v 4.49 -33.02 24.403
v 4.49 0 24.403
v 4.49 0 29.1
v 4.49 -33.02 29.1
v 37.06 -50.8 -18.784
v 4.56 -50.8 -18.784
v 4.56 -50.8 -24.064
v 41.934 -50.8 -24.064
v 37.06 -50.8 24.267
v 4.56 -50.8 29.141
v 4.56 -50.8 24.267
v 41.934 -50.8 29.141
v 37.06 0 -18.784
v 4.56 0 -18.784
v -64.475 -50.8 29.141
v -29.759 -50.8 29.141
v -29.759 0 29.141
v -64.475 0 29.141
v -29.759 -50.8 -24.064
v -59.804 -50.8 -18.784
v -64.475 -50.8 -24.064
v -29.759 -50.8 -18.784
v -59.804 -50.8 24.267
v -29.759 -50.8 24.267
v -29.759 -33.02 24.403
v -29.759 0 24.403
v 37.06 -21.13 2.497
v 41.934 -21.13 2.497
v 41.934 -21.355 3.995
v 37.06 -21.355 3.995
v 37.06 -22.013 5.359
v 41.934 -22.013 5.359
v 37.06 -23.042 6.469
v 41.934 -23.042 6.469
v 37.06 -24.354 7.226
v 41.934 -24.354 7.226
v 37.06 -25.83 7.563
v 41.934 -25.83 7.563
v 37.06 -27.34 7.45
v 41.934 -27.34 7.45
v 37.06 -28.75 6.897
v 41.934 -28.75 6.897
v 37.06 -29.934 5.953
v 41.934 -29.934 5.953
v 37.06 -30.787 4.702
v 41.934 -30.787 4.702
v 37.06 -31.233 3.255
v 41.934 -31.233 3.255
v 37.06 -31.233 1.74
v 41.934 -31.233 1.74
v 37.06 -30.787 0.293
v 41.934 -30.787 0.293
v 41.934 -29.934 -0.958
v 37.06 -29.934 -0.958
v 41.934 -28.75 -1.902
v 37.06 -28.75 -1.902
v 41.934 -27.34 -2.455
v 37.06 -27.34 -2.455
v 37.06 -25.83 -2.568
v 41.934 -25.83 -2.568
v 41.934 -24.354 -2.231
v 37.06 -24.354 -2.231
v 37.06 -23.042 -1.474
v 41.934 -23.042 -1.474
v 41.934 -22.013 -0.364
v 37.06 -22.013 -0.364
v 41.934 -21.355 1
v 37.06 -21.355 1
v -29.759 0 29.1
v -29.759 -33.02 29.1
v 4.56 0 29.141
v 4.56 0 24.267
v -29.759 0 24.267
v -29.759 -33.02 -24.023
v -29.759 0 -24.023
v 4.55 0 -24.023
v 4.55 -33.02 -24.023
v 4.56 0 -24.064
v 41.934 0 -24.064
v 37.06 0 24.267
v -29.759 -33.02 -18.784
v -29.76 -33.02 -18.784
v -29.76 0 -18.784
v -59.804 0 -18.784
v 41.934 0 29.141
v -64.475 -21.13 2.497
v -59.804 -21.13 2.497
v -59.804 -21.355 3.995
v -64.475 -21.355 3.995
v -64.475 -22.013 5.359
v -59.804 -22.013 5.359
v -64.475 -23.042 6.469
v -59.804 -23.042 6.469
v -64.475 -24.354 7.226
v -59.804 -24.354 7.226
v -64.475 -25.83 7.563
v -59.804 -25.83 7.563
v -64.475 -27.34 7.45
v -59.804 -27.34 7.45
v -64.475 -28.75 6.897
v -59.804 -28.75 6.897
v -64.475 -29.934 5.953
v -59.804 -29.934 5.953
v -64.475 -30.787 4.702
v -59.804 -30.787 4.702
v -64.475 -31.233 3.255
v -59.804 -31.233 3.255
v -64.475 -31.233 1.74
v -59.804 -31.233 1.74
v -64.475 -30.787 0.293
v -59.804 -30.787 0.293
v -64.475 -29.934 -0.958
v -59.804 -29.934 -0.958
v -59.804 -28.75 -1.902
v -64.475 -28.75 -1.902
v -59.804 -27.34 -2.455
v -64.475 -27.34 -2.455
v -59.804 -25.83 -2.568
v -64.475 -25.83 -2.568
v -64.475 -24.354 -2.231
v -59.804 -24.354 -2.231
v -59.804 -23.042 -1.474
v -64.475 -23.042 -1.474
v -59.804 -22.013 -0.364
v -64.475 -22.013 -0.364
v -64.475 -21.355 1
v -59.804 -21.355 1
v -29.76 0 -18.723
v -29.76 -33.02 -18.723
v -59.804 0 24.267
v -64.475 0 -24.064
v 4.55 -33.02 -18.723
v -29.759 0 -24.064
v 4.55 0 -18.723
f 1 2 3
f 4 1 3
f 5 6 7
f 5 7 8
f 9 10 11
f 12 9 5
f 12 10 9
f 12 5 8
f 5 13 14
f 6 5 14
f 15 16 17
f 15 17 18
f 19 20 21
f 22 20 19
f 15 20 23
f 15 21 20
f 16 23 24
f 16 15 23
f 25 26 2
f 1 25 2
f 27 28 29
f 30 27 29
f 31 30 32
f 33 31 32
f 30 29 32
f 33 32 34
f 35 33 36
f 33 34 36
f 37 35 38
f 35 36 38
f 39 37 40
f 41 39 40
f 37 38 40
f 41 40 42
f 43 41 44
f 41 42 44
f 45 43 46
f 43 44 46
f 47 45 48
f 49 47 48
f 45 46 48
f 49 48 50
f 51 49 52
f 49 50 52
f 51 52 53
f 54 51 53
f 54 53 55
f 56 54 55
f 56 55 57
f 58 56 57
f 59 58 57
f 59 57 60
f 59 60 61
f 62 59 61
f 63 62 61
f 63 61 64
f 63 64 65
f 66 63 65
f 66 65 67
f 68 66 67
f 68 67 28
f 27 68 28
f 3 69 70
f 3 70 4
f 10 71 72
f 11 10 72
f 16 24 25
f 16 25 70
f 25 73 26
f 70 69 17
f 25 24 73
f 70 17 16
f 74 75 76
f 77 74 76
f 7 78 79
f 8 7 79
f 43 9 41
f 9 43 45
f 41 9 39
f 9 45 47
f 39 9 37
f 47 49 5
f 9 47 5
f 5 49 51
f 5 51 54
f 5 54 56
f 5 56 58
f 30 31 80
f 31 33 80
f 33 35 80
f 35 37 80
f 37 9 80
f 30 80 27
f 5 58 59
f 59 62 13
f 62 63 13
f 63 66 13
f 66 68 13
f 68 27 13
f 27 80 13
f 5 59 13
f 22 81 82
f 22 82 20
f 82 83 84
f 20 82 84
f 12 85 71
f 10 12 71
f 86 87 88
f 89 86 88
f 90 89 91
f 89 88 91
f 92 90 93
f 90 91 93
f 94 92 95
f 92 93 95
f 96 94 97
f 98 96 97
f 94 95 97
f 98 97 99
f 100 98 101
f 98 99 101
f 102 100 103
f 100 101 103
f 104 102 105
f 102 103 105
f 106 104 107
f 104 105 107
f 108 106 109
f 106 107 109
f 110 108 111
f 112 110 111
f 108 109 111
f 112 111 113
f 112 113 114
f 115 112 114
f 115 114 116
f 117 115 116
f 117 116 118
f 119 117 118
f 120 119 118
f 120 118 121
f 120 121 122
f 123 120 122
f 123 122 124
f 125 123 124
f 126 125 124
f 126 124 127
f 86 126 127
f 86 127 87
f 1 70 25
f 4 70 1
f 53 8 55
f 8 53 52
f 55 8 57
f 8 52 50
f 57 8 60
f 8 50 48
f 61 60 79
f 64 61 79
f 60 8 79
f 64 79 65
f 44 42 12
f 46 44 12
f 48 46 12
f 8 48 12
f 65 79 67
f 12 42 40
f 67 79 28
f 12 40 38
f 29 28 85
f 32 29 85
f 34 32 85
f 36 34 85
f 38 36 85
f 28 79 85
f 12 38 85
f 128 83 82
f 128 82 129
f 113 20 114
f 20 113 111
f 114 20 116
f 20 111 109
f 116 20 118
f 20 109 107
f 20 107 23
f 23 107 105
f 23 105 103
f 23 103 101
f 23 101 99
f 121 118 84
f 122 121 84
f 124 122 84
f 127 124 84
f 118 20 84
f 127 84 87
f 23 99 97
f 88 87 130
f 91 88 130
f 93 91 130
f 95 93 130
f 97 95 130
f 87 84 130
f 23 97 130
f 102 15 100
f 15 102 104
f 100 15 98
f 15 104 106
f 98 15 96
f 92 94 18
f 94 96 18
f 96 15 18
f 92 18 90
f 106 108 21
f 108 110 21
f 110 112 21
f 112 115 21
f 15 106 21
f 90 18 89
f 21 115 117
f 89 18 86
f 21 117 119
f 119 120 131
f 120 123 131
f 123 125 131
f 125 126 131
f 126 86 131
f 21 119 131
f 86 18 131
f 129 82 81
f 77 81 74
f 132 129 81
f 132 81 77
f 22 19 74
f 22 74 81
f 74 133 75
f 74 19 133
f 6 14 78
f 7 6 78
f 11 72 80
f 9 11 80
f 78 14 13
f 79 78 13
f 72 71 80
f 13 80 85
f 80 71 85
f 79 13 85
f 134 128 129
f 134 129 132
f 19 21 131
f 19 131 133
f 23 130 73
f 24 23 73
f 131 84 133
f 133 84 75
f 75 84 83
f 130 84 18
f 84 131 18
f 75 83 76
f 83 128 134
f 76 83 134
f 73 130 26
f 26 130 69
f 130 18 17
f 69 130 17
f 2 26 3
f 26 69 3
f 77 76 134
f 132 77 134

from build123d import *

# Parameters (mm, degrees)
F1_DEPTH = 50.8
F2_W     = 34.310213
F2_H     = 5.299702
F2_W_2   = 34.250349
F2_H_2   = 4.696828
F3_DEPTH = 33.02
F5_D     = 10.16


with BuildPart() as f1:
    # F0 (on Front) → F1 (new body)
    with BuildSketch(Plane.XZ):
        Polygon((-29.758517, 29.140698), (-64.475067, 29.140698), (-64.475067, -24.063922), (-29.758517, -24.063922), (-29.758517, -18.784074), (-59.804428, -18.784074), (-59.804428, 24.266992), (-29.758517, 24.266992), align=None)
        Polygon((41.934177, -24.063922), (41.934177, 29.140698), (4.560493, 29.140698), (4.560493, 24.266992), (37.060469, 24.266992), (37.060469, -18.784074), (4.560493, -18.784074), (4.560493, -24.063922), align=None)
    extrude(amount=F1_DEPTH)

    # F2 (on Front) → F3 (join)
    with BuildSketch(Plane.XZ):
        with Locations((-12.605155, -21.372894)):
            Rectangle(F2_W, F2_H)
        with Locations((-12.635087, 26.751194)):
            Rectangle(F2_W_2, F2_H_2)
    extrude(amount=F3_DEPTH)

    # F5 (through all)
    with Locations(Plane(origin=(-64.475067, 0, 0), x_dir=(0, -1, 0), z_dir=(-1, 0, 0))):
        with Locations((26.209798, 2.497482)):
            Hole(F5_D / 2)


solid = f1.part
